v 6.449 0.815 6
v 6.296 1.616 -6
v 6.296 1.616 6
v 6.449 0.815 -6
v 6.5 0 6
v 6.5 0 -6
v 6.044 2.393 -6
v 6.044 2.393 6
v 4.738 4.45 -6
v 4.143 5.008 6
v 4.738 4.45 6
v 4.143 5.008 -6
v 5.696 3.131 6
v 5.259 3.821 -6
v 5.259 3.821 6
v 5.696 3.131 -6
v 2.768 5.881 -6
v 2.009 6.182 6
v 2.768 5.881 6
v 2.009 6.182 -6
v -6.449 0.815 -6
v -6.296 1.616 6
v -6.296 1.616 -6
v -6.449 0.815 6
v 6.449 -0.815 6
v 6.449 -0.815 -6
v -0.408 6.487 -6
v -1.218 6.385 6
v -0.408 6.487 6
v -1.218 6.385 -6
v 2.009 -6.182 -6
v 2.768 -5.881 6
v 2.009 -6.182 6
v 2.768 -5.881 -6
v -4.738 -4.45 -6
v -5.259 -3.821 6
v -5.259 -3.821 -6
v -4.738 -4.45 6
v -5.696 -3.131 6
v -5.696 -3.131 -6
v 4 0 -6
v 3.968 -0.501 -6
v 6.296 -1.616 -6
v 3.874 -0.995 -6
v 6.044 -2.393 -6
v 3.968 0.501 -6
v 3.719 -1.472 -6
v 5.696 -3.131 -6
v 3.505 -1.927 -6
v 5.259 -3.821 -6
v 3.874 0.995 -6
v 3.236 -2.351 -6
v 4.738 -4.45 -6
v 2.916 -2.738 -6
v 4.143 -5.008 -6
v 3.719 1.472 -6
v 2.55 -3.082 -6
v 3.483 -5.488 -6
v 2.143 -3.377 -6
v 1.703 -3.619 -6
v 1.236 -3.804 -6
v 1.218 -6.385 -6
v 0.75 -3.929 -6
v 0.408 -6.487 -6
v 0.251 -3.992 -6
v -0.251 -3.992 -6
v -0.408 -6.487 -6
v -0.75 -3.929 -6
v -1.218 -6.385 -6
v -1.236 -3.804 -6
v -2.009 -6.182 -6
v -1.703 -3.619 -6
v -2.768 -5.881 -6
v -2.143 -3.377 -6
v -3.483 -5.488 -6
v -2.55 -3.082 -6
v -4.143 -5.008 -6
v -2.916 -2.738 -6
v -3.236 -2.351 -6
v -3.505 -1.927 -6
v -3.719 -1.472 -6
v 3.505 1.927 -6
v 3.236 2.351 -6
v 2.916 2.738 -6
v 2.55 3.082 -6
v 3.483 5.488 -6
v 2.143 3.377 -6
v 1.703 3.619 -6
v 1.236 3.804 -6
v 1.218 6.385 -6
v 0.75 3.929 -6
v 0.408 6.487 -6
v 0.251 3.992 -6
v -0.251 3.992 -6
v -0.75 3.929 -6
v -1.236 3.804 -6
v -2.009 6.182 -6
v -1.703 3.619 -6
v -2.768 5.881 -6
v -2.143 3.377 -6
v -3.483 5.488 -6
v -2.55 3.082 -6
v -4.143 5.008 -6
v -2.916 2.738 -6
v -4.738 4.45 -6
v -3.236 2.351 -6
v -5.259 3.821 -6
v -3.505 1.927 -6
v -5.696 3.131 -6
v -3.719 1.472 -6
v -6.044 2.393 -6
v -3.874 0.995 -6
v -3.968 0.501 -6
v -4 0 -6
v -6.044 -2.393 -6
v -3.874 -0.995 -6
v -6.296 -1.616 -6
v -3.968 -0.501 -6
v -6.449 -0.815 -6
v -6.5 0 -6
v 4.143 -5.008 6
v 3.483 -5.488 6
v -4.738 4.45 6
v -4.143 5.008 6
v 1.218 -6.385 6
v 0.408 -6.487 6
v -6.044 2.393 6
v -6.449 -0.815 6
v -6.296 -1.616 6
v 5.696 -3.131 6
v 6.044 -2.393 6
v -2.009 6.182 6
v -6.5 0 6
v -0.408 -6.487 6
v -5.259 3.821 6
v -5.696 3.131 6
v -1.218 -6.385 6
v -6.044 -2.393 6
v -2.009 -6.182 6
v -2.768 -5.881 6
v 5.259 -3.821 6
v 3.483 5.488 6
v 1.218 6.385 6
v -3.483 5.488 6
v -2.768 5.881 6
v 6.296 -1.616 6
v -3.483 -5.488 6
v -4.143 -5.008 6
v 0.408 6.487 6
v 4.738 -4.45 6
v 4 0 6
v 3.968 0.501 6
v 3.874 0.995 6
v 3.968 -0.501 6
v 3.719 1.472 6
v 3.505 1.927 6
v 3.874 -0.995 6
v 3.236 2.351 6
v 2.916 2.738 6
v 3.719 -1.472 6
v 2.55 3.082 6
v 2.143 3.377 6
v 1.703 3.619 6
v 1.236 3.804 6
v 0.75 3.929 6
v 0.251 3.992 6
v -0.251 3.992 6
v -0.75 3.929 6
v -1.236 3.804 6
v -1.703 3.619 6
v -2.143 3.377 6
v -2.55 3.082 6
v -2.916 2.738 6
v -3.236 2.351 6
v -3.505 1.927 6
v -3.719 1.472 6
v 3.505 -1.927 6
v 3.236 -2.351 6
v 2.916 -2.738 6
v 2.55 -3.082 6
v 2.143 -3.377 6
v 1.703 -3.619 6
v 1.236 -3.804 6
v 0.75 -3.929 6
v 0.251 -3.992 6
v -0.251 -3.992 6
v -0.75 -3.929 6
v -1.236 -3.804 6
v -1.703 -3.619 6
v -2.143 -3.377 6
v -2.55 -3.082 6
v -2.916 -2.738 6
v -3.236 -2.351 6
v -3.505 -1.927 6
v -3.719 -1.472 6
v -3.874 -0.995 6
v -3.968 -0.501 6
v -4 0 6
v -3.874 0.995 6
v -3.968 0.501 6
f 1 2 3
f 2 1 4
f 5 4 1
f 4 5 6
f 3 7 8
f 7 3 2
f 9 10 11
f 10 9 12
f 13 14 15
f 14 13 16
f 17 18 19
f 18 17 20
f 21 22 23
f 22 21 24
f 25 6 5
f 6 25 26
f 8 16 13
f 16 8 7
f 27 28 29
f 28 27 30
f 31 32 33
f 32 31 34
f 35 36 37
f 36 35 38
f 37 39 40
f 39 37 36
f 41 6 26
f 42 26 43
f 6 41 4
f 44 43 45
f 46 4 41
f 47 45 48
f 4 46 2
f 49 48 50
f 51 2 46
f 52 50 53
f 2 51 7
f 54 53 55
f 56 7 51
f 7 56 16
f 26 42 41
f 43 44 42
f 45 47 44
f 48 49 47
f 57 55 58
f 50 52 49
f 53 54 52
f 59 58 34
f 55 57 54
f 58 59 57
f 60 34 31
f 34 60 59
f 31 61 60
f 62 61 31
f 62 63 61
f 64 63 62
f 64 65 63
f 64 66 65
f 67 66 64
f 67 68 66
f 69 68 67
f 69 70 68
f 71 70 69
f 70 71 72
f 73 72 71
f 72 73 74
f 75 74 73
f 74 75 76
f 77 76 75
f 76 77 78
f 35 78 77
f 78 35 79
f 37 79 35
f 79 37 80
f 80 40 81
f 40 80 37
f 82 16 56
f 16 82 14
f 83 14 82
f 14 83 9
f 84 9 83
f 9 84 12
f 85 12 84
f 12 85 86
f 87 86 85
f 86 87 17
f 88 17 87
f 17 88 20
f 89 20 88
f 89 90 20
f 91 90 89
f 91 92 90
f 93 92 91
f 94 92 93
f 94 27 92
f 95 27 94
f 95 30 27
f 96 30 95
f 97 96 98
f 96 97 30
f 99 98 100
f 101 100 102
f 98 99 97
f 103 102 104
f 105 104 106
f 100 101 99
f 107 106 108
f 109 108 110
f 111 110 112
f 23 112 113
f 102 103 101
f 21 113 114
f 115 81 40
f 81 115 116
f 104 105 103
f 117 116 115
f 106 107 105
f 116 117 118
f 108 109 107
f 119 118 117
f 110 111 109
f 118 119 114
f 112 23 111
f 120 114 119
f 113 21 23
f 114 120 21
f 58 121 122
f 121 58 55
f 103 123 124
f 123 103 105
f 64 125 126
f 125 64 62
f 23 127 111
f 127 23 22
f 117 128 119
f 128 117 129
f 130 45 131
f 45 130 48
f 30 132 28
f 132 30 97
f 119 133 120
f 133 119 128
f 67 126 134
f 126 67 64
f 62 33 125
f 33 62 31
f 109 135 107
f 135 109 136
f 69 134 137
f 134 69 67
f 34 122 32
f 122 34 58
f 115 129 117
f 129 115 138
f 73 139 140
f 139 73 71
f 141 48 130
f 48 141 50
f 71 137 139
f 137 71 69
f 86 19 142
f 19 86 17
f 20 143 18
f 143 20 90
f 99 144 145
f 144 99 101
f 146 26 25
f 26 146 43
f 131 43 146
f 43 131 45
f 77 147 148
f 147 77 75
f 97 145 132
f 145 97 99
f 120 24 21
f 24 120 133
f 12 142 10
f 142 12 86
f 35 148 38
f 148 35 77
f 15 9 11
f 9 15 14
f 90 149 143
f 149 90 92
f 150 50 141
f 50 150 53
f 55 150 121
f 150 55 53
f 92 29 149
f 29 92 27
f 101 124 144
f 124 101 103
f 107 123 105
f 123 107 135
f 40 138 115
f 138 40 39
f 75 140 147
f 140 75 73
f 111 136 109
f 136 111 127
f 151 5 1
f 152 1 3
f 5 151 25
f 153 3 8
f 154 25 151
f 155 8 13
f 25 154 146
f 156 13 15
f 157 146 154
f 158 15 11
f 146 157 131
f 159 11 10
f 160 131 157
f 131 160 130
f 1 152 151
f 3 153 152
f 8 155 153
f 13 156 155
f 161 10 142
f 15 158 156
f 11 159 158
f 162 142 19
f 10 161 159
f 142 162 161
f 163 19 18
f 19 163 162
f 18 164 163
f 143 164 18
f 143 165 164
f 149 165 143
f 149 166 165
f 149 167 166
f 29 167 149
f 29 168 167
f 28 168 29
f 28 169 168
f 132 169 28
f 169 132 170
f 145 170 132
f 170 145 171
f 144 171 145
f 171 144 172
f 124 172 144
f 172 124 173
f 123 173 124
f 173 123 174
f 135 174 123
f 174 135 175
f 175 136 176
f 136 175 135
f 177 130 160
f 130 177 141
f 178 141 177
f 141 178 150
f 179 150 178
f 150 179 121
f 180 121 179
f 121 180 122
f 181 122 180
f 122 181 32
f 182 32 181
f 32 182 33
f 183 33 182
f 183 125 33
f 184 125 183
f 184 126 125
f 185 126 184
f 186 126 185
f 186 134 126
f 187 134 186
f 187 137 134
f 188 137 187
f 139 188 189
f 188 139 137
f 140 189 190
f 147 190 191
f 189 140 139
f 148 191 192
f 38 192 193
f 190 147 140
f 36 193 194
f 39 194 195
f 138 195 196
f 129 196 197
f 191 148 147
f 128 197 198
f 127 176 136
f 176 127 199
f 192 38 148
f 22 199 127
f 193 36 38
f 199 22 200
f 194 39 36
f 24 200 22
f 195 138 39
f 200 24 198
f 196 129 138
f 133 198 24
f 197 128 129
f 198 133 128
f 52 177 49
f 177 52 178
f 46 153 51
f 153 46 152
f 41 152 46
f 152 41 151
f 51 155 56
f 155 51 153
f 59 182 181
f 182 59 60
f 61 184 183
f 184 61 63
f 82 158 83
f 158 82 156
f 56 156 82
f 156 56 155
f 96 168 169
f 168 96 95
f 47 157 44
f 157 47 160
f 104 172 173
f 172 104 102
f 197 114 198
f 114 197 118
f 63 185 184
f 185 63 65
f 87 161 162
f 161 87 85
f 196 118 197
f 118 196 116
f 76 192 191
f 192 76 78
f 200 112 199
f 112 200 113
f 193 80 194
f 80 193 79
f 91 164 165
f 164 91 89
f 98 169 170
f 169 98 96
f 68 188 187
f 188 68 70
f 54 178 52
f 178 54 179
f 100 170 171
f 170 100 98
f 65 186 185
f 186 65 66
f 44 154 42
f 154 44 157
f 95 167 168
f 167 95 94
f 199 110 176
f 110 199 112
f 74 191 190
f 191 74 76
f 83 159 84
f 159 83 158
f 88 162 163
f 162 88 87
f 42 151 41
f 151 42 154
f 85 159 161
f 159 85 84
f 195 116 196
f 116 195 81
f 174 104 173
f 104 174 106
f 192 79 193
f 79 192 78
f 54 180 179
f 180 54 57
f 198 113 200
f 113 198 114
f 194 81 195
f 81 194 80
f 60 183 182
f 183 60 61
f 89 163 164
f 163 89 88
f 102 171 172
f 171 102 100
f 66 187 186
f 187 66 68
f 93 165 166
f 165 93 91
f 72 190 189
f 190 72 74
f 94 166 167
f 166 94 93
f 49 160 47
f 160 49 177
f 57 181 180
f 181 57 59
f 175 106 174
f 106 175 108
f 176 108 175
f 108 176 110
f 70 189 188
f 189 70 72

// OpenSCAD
$fn = 50;


difference() {
	union() {
		translate(v = [0, 0, -6.0000000000]) {
			cylinder(h = 12, r = 6.5000000000);
		}
	}
	union() {
		translate(v = [0, 0, -100.0000000000]) {
			cylinder(h = 200, r = 4.0000000000);
		}
	}
}
